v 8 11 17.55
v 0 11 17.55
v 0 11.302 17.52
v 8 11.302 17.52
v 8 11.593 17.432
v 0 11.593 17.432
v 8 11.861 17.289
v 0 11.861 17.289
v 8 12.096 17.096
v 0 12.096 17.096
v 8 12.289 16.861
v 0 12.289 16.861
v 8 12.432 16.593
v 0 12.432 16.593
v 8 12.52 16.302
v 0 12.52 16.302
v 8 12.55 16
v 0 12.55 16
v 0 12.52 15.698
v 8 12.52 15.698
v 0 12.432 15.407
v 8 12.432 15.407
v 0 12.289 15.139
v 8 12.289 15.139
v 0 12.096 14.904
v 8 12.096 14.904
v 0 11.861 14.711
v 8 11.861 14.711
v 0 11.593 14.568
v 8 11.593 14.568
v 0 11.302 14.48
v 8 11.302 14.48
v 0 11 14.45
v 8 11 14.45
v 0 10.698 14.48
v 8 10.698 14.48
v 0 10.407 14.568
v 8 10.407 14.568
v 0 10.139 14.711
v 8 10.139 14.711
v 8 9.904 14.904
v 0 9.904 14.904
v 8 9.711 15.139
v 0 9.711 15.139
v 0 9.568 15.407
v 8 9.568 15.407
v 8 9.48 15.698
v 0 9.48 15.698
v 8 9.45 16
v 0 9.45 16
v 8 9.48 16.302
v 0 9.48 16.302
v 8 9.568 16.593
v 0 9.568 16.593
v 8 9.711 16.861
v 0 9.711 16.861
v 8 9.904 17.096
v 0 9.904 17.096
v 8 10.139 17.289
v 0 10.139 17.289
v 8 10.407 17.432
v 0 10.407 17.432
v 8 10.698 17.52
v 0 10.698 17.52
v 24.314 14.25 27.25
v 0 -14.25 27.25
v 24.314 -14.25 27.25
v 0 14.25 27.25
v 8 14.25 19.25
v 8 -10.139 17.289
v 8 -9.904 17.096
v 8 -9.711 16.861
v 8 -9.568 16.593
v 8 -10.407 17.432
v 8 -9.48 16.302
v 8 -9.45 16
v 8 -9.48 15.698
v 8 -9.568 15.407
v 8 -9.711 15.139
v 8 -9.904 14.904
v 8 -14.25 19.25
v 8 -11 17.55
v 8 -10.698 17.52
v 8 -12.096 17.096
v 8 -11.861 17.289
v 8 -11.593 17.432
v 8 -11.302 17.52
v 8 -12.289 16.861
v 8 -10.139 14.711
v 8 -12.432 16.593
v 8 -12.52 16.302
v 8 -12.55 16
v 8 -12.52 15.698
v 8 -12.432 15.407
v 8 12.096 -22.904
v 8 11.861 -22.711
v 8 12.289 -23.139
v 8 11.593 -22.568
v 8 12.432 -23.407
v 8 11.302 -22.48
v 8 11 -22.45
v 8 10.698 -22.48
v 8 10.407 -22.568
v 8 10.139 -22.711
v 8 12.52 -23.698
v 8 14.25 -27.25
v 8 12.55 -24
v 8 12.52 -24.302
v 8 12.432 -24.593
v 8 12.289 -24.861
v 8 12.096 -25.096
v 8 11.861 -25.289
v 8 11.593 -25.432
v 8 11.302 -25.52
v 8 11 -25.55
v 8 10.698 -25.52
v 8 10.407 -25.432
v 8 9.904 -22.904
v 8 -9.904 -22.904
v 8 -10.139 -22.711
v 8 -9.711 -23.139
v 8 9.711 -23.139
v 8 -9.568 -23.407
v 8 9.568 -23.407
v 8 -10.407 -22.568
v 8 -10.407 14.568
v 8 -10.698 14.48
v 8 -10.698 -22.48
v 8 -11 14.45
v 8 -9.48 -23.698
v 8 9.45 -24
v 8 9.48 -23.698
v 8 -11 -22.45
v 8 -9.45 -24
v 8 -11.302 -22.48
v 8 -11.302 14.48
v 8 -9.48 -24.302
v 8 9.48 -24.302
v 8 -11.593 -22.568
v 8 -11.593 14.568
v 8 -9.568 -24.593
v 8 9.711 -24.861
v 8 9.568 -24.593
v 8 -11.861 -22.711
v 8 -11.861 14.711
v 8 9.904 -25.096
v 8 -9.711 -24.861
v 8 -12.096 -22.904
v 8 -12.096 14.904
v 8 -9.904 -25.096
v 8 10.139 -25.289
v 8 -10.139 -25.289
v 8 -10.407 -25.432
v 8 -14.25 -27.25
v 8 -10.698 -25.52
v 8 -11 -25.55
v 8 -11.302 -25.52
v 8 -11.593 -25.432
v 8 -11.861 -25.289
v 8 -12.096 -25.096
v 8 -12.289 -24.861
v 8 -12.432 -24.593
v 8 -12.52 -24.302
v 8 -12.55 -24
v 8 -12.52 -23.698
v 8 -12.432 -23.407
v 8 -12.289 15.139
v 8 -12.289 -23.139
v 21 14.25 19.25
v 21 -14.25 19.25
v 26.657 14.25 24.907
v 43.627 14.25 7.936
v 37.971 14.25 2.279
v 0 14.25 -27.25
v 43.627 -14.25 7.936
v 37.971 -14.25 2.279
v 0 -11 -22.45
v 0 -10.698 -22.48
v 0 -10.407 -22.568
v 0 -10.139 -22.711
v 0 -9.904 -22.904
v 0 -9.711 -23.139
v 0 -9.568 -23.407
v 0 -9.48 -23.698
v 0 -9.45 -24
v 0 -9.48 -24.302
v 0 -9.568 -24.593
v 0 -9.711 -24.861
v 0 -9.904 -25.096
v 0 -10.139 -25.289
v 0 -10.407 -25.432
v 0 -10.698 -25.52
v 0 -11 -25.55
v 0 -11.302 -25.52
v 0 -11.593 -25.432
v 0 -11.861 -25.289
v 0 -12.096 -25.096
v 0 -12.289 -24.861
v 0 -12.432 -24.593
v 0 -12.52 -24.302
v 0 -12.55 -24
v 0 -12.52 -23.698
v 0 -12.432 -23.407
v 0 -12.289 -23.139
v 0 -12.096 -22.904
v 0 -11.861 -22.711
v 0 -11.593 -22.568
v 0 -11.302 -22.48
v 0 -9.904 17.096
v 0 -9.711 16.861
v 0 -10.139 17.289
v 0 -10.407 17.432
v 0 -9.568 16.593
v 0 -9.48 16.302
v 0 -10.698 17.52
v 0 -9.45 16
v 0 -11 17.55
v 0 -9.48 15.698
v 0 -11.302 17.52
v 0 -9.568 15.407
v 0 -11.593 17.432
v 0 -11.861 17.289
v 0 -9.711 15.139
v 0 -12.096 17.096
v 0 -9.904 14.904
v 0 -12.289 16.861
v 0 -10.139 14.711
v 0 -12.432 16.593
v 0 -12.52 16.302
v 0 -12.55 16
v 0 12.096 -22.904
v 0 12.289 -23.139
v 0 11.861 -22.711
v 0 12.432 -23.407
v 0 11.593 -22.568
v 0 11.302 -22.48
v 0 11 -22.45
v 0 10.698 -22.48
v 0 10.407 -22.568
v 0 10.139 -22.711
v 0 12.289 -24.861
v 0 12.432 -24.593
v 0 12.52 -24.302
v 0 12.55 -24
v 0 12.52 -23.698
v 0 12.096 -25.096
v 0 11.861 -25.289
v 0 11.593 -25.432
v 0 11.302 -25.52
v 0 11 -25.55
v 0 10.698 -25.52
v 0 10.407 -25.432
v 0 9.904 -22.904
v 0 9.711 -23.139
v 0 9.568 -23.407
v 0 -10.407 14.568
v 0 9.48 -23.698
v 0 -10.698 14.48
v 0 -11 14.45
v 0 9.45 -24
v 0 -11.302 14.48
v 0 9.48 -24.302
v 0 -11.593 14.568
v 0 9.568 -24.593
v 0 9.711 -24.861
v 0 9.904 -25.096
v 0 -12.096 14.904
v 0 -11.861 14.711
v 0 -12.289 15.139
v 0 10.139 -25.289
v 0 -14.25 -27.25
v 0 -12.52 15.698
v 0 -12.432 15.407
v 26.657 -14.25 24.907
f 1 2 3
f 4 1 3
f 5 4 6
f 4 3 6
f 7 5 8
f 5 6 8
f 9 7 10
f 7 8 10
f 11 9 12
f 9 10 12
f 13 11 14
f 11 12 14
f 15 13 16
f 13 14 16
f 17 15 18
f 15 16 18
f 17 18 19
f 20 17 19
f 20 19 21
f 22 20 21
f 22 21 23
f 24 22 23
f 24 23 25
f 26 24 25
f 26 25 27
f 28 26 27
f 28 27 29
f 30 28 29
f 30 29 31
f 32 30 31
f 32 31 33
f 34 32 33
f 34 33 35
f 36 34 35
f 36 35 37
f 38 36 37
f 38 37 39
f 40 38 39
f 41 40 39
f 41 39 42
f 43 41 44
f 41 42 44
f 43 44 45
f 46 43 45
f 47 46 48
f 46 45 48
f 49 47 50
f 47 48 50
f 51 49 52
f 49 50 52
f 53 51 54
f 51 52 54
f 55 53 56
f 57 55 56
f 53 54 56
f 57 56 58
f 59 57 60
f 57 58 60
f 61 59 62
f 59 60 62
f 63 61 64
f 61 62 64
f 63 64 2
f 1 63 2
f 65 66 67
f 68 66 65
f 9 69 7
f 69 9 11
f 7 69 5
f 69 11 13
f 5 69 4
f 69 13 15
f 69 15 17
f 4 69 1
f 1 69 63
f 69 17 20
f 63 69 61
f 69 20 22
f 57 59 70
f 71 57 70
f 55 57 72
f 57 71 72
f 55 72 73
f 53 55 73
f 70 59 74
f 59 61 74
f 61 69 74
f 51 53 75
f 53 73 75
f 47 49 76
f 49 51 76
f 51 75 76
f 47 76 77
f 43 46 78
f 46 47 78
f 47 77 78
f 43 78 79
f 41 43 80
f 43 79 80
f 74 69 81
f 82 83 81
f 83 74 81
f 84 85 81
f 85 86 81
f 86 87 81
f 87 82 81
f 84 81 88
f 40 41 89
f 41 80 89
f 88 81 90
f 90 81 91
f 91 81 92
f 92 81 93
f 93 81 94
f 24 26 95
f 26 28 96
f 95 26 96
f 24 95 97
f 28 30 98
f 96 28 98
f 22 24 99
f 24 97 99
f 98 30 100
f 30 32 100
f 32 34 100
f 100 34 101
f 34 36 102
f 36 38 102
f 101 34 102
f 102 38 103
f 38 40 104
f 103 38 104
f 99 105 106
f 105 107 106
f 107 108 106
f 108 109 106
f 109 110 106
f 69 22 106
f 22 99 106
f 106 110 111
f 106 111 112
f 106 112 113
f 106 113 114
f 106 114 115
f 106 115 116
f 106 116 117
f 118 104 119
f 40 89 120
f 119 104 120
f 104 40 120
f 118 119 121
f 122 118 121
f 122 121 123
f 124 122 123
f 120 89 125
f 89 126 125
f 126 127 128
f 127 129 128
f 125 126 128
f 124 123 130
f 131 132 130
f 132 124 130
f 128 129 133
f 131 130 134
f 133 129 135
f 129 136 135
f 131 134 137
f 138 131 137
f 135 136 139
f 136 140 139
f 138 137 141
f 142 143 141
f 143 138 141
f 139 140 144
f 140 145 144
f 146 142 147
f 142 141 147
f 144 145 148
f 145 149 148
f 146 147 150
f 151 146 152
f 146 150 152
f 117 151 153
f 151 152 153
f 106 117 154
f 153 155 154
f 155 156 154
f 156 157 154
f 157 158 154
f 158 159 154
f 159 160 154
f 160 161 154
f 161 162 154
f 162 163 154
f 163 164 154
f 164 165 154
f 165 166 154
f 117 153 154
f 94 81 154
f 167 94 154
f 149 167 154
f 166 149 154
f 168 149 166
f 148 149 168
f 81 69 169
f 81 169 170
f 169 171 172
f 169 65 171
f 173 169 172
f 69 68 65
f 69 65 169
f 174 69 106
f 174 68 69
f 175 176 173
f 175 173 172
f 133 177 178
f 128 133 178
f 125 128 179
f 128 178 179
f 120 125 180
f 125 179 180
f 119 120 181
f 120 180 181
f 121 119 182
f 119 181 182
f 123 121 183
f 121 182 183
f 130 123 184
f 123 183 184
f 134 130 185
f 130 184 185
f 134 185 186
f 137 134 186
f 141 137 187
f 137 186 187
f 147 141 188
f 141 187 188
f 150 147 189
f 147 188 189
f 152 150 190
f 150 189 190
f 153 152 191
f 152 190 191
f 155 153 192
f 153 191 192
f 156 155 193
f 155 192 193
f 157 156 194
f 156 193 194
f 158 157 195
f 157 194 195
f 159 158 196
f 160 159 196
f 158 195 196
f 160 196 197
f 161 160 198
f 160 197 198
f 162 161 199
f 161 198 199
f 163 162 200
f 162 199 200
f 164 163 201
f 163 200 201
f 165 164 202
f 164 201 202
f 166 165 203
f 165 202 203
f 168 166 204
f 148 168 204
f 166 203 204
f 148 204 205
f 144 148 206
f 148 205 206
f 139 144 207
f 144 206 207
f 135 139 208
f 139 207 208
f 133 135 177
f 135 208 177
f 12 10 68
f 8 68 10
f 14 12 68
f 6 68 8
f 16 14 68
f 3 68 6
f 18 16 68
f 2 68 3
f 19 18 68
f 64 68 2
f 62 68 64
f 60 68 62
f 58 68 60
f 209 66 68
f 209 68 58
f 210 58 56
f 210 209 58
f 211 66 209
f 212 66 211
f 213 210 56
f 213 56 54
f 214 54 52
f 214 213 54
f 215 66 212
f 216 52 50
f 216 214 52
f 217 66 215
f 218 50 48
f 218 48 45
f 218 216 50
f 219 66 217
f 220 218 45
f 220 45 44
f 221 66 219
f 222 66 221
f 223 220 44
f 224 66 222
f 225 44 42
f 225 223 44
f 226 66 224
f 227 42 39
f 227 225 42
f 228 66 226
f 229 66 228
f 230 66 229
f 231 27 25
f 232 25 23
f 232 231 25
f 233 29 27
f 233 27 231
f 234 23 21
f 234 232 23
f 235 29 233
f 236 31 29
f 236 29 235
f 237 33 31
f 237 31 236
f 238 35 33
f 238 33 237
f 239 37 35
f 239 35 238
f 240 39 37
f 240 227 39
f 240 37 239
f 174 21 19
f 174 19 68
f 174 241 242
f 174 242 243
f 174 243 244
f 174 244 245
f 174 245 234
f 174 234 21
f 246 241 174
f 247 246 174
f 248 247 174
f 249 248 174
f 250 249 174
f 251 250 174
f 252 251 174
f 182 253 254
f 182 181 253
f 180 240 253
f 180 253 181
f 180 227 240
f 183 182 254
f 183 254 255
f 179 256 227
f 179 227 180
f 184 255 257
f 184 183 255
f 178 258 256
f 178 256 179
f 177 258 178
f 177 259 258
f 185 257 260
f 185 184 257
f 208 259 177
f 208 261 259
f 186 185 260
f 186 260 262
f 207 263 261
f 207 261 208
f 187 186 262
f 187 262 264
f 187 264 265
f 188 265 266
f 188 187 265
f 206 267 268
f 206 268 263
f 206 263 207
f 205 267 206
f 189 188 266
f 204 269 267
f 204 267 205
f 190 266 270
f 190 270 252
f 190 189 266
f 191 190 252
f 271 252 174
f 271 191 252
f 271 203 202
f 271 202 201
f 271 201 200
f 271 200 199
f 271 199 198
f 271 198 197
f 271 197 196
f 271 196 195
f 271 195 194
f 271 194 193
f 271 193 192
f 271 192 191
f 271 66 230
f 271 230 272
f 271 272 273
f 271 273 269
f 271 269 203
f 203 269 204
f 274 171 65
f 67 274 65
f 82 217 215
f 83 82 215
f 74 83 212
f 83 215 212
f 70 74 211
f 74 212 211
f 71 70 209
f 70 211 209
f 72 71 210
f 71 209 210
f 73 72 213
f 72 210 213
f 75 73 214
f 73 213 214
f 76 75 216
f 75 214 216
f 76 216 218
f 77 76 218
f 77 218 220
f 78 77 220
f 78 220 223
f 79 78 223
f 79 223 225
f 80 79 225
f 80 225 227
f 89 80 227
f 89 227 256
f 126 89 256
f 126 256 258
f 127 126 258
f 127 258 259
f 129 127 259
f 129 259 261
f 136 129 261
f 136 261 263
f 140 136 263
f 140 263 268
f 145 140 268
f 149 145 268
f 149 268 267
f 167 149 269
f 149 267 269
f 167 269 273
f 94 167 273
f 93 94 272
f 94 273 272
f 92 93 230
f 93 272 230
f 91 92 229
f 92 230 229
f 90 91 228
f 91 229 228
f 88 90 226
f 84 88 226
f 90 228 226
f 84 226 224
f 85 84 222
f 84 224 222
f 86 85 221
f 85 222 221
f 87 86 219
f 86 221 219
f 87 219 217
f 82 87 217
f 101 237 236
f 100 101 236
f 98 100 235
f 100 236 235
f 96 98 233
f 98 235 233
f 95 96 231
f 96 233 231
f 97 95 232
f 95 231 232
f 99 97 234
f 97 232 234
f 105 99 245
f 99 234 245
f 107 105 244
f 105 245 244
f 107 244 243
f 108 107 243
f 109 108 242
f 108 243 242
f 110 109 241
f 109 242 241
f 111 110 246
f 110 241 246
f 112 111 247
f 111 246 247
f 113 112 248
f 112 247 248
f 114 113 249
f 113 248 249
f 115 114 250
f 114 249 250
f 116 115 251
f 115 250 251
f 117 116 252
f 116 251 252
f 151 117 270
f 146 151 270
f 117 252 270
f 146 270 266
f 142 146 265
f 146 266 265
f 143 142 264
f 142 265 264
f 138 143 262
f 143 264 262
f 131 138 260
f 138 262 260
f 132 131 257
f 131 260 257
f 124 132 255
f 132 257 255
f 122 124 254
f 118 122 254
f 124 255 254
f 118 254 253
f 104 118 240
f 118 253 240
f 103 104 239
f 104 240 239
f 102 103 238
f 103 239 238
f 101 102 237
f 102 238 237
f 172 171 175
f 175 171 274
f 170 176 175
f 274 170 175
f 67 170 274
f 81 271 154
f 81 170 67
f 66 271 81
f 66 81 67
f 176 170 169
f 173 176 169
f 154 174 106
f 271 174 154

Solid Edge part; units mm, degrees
sketch "Sketch1" plane through (0, 0, 0) normal (1, 0, 0) x (0, 1, 0)
  line L0 (-14.25, -27.25) -> (-14.25, 27.25)
  line L1 (-14.25, 27.25) -> (14.25, 27.25)
  line L2 (14.25, 27.25) -> (14.25, -27.25)
  line L3 (14.25, -27.25) -> (-14.25, -27.25)
extrude "Protrusion1" add sketch "Sketch1" along normal blind 8
sketch "Sketch2" plane through (8, 0, 0) normal (1, 0, 0) x (0, 1, 0)
  line L0 (14.25, 19.25) -> (-14.25, 19.25)
  line L1 (-14.25, 19.25) -> (-14.25, 27.25)
  line L2 (-14.25, 27.25) -> (14.25, 27.25)
  line L3 (14.25, 27.25) -> (14.25, 19.25)
extrude "Extrusionsausprägung_2" add sketch "Sketch2" along normal blind 13
hole "Bohrung_1" at (0, 11, -24) direction (1, 0, 0) diameter 3.1 end through all
pattern_linear "Pattern1" count 2 spacing 22 along (0, -1, 0) count 2 spacing 40 along (0, 0, 1) of "Bohrung_1"
draft "Formschräge_3" angle 45 neutral plane through (18.75, 0, 19.25) normal (0, 0, -1) pull direction (0, 0, -1) face at (21, 9.215, 25.9967)
sketch "Sketch3" plane through (29.25, 0, 27.5) normal (0.7071068, 0, -0.7071068) x (0, 1, 0)
  line L0 (-14.25, -11.6673) -> (14.25, -11.6673)
  line L1 (14.25, -11.6673) -> (14.25, -3.6673)
  line L2 (14.25, -3.6673) -> (-14.25, -3.6673)
  line L3 (-14.25, -3.6673) -> (-14.25, -11.6673)
  dimension "D1" = 28.5
  dimension "D2" = 8
extrude "Extrusionsausprägung_3" add sketch "Sketch3" along normal blind 24
hole "Bohrung_3" [suppressed]
pattern "Pattern3" [suppressed]
sketch "Sketch4" plane through (32.5061, -14.25, 0) normal (0, -1, 0) x (1, 0, 0)
  line L0 (-5.8492, 24.9069) -> (-8.1924, 27.25)
extrude "Cutout1" cut sketch "Sketch4" against normal through all material side at (25.5207, -14.25, 26.1138)
